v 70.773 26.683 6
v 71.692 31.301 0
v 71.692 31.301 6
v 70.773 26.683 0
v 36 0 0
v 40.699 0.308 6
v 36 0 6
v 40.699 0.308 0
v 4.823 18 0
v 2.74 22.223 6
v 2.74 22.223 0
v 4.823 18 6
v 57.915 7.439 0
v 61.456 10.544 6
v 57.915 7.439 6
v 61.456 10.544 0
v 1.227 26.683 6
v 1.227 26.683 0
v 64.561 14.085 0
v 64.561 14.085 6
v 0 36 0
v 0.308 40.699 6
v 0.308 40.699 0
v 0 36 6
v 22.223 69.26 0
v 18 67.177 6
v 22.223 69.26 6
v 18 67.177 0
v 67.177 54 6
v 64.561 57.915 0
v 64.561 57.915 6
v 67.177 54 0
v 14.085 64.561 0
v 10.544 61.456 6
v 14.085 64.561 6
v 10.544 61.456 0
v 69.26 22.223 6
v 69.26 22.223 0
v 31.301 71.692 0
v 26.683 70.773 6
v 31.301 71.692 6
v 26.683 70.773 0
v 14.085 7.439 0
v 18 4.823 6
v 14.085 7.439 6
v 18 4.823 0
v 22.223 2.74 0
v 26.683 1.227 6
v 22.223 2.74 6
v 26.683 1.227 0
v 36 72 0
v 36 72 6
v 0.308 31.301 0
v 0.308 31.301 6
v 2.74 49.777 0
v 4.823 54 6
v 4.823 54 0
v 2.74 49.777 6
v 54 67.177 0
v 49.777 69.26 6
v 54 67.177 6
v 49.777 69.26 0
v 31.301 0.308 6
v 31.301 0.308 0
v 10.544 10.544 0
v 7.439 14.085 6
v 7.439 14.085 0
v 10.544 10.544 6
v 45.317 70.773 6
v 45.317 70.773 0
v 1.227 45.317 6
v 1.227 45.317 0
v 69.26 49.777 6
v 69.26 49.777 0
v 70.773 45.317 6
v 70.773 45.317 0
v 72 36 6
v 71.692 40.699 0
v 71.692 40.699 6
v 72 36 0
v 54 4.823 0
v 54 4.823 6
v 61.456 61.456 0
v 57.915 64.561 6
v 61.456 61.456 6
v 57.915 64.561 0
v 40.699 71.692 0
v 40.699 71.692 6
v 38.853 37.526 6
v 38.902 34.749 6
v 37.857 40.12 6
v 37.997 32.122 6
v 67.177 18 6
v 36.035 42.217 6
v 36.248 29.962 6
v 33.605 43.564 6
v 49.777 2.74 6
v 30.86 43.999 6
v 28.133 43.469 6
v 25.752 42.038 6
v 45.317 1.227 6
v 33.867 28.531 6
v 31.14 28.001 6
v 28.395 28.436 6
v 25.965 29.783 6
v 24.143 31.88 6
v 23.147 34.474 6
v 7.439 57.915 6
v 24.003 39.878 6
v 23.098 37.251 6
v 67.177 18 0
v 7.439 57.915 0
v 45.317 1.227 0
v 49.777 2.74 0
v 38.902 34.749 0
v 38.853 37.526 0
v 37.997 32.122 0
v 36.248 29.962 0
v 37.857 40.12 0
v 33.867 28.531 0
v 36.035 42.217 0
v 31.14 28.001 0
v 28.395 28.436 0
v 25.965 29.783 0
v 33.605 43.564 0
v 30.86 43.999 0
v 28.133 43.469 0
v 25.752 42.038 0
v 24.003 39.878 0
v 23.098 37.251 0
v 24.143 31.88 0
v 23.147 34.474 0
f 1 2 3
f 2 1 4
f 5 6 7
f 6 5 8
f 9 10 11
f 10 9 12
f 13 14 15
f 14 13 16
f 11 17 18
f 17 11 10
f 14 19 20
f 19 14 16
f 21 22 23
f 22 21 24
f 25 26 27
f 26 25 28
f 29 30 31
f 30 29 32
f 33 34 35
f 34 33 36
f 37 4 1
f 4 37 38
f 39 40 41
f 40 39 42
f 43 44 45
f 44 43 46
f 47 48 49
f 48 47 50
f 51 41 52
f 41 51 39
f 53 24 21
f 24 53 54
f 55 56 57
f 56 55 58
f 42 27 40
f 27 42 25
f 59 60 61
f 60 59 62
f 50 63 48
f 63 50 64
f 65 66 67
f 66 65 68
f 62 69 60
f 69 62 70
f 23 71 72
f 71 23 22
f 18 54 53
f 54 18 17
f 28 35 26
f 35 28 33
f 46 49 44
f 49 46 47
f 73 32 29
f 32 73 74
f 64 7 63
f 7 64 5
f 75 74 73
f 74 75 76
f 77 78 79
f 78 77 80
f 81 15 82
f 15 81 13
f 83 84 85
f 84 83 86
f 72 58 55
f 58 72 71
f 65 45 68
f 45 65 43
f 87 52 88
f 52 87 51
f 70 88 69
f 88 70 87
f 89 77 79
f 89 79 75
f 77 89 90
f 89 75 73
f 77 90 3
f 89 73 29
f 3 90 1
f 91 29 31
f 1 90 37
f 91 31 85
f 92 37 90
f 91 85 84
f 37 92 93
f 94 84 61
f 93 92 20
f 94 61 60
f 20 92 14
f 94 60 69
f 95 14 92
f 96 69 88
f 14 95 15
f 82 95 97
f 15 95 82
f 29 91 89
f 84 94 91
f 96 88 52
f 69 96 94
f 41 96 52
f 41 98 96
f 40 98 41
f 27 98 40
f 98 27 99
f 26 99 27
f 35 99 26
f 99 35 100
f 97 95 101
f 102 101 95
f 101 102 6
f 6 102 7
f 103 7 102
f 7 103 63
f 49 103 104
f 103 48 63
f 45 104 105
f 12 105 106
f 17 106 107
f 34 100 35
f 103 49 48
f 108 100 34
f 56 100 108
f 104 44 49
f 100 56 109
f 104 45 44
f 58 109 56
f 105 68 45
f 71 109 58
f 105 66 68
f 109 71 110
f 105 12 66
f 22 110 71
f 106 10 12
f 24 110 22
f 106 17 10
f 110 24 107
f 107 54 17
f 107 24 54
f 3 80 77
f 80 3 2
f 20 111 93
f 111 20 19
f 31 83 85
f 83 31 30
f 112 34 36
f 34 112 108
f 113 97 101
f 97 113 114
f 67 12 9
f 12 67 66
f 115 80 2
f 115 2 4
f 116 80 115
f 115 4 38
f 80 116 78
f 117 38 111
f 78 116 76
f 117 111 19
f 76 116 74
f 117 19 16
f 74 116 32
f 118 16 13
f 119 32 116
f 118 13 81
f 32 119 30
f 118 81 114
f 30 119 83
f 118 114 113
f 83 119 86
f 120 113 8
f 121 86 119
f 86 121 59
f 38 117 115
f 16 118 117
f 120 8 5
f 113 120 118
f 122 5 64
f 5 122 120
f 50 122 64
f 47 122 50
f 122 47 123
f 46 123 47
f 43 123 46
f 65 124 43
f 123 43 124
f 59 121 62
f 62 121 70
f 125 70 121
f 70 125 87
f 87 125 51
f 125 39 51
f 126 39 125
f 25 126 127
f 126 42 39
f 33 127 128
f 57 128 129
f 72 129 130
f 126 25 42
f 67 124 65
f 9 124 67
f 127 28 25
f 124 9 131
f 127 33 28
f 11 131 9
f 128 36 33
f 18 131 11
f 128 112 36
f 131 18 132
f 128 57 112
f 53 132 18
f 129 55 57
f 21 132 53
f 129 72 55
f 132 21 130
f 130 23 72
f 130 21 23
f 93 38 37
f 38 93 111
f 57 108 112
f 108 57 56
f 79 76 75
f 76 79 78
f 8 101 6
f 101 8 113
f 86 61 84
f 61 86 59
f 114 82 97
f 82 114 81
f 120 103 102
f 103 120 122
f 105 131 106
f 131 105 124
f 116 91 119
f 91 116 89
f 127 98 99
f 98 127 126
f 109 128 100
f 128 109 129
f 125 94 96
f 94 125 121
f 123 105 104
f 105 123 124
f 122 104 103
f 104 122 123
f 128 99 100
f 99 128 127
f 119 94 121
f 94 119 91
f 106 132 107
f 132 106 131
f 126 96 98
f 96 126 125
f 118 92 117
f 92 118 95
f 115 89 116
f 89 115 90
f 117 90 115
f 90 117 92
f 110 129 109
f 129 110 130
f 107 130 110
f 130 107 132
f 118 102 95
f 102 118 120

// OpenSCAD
$fn = 32;

// ----------------------------------------------------------------------
// Cam plate: eccentric cam, base R36
// ----------------------------------------------------------------------

// --- parameters (mm) ---
base_r = 36;              // base circle radius
lobe_h = 14;              // cam lobe rise
bore_r = 8;               // shaft bore radius
plate_t = 6;              // plate thickness, Z (extrusion height)
ecc = 5;                  // disc eccentricity

profile = [[72, 36], [71.692, 40.699], [70.773, 45.317], [69.26, 49.777], [67.177, 54], [64.561, 57.915], [61.456, 61.456], [57.915, 64.561], [54, 67.177], [49.777, 69.26], [45.317, 70.773], [40.699, 71.692], [36, 72], [31.301, 71.692], [26.683, 70.773], [22.223, 69.26], [18, 67.177], [14.085, 64.561], [10.544, 61.456], [7.439, 57.915], [4.823, 54], [2.74, 49.777], [1.227, 45.317], [0.308, 40.699], [0, 36], [0.308, 31.301], [1.227, 26.683], [2.74, 22.223], [4.823, 18], [7.439, 14.085], [10.544, 10.544], [14.085, 7.439], [18, 4.823], [22.223, 2.74], [26.683, 1.227], [31.301, 0.308], [36, 0], [40.699, 0.308], [45.317, 1.227], [49.777, 2.74], [54, 4.823], [57.915, 7.439], [61.456, 10.544], [64.561, 14.085], [67.177, 18], [69.26, 22.223], [70.773, 26.683], [71.692, 31.301]];  // primary outline, 48 points, counter clockwise
void_1 = [[38.853, 37.526], [37.857, 40.12], [36.035, 42.217], [33.605, 43.564], [30.86, 43.999], [28.133, 43.469], [25.752, 42.038], [24.003, 39.878], [23.098, 37.251], [23.147, 34.474], [24.143, 31.88], [25.965, 29.783], [28.395, 28.436], [31.14, 28.001], [33.867, 28.531], [36.248, 29.962], [37.997, 32.122], [38.902, 34.749]];  // shaft bore, 18 points

// --- the one profile operation ---
difference() {
  linear_extrude(height = plate_t) polygon(points = profile);
  translate([0, 0, -1])
    linear_extrude(height = plate_t + 2) polygon(points = void_1);
}
